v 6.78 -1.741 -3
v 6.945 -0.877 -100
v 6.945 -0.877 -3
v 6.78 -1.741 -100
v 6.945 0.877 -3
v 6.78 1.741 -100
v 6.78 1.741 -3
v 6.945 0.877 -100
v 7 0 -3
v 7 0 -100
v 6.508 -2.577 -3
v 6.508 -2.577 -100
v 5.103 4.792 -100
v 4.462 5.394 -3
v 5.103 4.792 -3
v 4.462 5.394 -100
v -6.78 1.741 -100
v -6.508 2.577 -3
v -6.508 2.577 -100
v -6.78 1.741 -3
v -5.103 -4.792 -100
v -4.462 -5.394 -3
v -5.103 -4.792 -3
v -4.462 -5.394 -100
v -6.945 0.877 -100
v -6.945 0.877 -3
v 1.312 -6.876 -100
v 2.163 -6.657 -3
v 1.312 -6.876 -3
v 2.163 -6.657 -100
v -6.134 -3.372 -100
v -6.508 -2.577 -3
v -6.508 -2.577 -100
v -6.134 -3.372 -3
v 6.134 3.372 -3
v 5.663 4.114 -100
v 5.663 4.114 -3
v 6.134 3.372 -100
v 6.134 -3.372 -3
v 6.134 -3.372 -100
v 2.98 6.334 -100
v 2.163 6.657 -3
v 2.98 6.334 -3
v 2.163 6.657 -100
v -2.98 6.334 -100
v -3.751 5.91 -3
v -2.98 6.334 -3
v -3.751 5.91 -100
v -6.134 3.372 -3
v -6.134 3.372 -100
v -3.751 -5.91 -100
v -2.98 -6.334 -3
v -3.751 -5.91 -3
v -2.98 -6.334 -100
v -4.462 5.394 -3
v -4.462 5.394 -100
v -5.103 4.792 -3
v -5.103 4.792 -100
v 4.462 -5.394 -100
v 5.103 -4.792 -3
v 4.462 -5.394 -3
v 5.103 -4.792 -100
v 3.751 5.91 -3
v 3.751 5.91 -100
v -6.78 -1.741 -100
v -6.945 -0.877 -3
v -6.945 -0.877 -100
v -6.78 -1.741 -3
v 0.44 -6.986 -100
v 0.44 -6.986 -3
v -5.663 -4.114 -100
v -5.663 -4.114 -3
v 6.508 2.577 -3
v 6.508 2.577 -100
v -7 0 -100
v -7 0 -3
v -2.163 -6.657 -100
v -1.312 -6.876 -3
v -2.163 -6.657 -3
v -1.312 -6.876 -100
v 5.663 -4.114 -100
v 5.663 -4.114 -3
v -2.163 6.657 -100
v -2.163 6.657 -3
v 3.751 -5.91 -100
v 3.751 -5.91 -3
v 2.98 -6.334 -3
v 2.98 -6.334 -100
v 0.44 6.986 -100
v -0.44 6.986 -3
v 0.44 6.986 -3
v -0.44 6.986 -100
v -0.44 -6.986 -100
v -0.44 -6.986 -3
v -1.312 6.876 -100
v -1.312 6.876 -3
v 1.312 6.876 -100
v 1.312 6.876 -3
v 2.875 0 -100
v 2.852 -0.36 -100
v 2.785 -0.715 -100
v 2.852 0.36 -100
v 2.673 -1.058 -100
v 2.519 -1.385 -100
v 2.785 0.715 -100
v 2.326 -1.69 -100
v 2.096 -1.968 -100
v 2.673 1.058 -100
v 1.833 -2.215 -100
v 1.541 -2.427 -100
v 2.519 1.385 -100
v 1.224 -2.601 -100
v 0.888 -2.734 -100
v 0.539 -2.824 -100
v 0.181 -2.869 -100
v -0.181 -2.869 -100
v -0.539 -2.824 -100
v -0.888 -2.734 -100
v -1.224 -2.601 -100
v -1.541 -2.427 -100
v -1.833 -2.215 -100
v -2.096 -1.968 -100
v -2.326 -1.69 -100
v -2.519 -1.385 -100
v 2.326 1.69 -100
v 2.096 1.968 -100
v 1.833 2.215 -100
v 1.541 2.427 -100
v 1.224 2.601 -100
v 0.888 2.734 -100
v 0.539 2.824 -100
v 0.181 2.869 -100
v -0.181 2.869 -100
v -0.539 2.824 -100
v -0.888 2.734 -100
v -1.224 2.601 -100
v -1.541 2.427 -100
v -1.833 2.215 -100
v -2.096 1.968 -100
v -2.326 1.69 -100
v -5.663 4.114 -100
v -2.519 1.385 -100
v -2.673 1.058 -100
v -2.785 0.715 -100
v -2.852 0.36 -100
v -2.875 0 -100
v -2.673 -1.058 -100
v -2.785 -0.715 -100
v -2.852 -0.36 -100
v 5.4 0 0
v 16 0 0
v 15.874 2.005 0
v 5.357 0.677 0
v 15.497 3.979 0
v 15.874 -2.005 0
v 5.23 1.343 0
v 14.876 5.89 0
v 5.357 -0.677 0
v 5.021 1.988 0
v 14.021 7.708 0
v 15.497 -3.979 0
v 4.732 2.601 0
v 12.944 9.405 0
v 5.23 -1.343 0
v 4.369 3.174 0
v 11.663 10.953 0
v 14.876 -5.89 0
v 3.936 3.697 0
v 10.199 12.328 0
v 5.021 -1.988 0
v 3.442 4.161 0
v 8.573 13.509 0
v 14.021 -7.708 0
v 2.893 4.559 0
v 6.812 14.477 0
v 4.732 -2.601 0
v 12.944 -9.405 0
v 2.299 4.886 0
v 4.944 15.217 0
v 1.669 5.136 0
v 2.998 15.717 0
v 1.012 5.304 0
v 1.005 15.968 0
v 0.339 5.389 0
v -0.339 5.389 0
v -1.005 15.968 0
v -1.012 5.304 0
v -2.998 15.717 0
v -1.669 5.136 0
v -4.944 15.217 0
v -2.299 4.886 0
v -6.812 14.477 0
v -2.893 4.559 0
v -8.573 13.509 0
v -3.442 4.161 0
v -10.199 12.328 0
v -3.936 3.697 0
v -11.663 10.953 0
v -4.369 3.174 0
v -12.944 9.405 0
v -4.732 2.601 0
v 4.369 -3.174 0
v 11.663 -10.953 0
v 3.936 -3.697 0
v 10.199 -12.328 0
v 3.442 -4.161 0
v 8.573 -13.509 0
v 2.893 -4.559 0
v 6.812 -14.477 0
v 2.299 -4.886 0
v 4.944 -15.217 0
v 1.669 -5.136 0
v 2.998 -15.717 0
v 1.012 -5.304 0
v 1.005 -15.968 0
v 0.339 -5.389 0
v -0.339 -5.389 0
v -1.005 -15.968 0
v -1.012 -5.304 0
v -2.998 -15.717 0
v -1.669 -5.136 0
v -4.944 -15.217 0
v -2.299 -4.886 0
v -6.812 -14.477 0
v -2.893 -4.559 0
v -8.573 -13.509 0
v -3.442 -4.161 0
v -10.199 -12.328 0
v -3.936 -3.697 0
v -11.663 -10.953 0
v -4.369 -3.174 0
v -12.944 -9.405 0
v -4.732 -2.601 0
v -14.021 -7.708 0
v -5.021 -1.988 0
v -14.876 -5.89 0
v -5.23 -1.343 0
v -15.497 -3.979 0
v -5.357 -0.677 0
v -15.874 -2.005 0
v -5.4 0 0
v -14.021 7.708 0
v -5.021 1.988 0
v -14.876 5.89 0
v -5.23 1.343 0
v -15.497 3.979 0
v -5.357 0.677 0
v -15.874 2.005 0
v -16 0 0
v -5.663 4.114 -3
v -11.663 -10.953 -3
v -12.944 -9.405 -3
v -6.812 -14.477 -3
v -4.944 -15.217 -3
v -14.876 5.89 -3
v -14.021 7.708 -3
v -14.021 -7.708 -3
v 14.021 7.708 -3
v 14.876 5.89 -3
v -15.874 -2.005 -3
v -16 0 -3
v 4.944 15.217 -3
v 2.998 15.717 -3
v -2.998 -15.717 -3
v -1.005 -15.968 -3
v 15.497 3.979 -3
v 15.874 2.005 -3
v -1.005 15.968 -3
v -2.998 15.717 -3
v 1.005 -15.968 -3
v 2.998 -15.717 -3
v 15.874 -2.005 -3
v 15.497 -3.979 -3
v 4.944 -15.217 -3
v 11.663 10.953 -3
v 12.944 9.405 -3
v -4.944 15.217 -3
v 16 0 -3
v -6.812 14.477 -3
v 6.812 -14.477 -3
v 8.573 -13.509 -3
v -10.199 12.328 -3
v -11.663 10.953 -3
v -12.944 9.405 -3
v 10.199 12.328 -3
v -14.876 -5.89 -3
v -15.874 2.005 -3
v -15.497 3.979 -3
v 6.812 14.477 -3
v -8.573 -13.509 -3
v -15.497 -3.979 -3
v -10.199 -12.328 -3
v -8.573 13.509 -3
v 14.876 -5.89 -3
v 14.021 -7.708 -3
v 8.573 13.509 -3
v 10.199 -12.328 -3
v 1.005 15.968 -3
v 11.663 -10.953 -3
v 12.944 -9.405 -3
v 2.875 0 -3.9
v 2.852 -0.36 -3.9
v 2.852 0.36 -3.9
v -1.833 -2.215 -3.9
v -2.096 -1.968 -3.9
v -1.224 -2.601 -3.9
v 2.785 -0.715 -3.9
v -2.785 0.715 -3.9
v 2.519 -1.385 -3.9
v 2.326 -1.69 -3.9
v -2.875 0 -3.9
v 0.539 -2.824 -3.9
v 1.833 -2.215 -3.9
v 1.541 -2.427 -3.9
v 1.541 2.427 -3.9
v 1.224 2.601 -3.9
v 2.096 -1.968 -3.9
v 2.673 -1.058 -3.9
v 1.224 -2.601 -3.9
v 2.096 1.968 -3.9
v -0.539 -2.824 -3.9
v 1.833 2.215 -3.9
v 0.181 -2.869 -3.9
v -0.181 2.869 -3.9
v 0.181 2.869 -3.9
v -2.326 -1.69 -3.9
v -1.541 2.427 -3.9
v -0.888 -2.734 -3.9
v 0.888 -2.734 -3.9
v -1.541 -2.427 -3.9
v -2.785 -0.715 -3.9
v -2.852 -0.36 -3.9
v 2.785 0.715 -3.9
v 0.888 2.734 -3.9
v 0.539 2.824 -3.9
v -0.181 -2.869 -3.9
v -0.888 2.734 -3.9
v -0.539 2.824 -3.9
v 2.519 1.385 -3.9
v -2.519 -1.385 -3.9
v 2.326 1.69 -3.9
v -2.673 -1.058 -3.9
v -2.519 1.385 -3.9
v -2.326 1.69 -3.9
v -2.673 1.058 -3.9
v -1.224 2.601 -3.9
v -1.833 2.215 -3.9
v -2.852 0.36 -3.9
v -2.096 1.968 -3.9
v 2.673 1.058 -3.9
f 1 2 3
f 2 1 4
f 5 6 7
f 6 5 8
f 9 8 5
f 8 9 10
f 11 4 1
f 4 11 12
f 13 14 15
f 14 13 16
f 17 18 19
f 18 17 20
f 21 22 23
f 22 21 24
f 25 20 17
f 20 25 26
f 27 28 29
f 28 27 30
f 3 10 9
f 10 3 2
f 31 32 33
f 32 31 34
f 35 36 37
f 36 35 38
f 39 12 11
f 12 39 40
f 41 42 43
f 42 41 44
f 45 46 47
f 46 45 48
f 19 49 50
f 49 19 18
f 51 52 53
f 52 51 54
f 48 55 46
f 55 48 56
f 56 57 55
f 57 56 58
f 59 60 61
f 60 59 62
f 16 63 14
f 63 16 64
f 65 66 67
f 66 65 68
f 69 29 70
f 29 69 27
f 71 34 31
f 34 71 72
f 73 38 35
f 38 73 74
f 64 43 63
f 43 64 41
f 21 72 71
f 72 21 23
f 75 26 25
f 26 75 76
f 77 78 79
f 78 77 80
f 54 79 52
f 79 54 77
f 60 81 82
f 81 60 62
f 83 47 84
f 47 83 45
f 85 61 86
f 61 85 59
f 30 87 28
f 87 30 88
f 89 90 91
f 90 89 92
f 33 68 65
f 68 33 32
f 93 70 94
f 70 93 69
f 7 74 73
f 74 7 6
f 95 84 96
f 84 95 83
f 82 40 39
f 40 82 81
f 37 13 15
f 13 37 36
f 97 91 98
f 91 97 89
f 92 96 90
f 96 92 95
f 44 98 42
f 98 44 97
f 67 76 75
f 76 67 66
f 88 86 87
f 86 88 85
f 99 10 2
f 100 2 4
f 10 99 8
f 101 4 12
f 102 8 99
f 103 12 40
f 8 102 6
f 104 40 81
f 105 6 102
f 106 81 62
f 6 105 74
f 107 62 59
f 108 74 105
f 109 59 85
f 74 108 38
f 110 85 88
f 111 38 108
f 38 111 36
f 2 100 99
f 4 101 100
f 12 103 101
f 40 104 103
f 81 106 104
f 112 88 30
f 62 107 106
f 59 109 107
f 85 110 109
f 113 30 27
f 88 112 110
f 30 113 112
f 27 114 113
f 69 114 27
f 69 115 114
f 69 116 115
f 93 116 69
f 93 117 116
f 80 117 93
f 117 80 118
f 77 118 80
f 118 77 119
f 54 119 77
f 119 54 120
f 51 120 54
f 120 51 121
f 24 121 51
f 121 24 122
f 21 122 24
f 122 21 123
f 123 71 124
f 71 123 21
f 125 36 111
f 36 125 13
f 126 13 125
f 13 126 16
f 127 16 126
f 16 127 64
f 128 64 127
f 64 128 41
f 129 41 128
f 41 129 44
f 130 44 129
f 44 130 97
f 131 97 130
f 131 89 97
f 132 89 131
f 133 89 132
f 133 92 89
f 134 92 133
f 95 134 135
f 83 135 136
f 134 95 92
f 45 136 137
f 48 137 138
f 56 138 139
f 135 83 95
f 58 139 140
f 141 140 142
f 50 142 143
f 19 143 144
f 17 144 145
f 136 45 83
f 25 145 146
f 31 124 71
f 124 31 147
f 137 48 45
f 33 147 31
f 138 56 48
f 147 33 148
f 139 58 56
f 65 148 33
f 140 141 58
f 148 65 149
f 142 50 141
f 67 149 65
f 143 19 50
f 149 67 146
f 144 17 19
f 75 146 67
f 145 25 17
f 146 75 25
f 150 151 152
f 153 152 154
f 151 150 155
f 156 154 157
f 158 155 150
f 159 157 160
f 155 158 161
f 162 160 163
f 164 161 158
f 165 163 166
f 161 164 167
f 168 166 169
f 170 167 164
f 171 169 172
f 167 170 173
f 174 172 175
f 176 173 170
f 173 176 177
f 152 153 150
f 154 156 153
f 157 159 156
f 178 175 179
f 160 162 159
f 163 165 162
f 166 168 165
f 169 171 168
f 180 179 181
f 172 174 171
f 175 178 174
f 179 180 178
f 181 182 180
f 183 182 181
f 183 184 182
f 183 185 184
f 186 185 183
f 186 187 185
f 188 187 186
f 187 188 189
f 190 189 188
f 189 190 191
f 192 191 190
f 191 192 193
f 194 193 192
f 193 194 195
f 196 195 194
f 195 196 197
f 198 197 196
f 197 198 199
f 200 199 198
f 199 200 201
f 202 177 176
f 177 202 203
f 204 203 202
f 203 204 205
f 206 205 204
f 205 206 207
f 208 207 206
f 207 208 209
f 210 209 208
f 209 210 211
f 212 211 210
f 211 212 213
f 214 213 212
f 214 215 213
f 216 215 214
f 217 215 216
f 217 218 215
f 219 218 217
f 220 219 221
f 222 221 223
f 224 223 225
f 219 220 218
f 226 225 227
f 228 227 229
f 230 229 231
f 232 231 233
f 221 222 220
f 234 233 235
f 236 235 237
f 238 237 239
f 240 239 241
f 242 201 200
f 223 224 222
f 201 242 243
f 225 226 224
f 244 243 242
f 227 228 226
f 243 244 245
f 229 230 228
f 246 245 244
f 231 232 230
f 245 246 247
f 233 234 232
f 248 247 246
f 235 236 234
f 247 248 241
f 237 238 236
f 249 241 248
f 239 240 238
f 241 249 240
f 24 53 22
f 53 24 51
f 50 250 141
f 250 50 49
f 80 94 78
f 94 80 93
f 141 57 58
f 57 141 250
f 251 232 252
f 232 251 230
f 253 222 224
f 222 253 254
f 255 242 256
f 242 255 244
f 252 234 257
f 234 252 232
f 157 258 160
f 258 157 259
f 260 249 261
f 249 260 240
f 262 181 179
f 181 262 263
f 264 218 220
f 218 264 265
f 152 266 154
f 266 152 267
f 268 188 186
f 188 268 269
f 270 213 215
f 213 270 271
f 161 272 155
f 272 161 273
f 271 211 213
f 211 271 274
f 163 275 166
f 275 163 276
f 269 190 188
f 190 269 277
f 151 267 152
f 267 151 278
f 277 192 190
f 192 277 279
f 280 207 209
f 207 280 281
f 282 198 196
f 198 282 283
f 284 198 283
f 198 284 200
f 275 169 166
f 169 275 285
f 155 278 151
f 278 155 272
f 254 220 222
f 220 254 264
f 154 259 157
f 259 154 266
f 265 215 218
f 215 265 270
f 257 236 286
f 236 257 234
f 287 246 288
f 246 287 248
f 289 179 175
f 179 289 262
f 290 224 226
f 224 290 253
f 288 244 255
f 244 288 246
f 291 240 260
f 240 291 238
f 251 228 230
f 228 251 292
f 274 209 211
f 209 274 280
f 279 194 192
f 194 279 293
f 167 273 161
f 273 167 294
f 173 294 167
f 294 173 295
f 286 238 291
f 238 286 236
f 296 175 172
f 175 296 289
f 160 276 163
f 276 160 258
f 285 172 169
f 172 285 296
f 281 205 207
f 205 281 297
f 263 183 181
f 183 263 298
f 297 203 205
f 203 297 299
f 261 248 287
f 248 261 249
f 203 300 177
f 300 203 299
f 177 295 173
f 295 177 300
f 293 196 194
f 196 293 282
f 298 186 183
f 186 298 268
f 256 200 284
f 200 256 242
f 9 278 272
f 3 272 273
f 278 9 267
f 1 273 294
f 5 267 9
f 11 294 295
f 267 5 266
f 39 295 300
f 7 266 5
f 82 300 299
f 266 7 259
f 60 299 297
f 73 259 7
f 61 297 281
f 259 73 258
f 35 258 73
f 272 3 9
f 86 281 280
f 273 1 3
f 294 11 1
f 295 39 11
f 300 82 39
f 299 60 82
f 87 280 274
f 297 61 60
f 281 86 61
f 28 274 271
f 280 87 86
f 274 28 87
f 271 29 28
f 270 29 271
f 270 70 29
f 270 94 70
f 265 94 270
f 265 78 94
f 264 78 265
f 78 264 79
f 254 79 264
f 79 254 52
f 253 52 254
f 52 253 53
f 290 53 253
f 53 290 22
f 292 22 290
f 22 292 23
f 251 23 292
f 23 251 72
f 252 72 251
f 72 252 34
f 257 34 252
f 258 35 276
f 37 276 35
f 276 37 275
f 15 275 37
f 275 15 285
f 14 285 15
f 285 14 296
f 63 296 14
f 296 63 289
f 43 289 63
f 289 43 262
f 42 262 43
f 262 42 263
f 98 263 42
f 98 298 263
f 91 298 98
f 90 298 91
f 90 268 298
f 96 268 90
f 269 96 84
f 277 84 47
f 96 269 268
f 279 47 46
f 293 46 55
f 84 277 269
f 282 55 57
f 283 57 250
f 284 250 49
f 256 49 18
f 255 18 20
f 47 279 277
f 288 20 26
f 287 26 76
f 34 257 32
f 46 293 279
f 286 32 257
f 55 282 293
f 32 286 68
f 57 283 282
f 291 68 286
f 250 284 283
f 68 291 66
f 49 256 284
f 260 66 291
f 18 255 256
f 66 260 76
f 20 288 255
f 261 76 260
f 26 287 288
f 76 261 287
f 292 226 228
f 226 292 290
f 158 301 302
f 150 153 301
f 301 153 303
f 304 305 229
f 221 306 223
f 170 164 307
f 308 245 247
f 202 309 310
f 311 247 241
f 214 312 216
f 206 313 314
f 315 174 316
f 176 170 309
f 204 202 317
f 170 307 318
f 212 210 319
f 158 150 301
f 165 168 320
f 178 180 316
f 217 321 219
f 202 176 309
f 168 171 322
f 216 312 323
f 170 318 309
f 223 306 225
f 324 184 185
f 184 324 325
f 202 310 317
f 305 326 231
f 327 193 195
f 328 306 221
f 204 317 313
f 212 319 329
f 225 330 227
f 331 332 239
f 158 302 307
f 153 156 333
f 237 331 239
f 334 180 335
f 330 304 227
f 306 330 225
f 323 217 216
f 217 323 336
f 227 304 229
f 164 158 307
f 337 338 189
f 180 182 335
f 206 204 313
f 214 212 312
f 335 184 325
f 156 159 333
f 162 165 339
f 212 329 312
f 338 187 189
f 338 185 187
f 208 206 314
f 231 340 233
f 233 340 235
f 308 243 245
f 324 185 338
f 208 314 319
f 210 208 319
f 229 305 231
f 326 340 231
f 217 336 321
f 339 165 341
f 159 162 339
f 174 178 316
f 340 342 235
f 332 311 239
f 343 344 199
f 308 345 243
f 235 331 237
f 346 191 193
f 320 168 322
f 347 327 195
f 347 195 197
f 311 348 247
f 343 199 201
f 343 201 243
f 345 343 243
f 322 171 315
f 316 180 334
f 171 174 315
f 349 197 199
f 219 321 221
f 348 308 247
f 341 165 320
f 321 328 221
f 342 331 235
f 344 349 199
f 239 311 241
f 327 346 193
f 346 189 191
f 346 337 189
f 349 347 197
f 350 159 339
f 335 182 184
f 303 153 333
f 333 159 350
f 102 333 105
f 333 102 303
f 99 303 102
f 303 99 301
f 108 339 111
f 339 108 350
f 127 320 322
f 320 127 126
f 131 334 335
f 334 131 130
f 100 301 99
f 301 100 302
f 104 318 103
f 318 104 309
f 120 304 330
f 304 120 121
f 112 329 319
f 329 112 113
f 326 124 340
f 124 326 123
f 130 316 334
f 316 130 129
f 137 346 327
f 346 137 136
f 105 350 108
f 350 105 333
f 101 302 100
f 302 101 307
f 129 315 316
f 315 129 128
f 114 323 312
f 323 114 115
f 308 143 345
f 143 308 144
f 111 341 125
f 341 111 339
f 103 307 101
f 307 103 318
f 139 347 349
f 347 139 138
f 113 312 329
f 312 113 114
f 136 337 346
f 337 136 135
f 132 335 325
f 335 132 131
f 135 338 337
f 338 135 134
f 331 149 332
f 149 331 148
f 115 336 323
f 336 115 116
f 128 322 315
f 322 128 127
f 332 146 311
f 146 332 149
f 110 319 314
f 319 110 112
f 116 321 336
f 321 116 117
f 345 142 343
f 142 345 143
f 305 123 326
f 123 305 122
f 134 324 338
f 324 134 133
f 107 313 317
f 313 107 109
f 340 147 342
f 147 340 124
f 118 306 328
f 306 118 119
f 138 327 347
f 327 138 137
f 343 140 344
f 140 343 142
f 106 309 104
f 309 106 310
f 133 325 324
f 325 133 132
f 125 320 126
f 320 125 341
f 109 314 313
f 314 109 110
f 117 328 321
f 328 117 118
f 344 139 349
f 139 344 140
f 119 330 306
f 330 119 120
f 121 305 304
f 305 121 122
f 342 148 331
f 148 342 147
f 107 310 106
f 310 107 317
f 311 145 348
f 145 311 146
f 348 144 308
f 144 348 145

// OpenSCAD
$fn = 50;


difference() {
	union() {
		translate(v = [0, 0, -100.0000000000]) {
			cylinder(h = 100, r = 7.0000000000);
		}
		translate(v = [0, 0, -3.0000000000]) {
			cylinder(h = 3, r = 16.0000000000);
		}
	}
	union() {
		translate(v = [0, 0, 0]) {
			rotate(a = [0, 0, 0]) {
				difference() {
					union() {
						#translate(v = [0, 0, -100.0000000000]) {
							cylinder(h = 100, r = 2.6000000000);
						}
						#translate(v = [0, 0, -3.9000000000]) {
							cylinder(h = 3.9000000000, r = 7.0000000000, r1 = 2.8750000000, r2 = 5.4000000000);
						}
						#translate(v = [0, 0, -100.0000000000]) {
							cylinder(h = 100, r = 2.8750000000);
						}
						#translate(v = [0, 0, -100.0000000000]) {
							cylinder(h = 100, r = 2.6000000000);
						}
					}
					union();
				}
			}
		}
	}
}
